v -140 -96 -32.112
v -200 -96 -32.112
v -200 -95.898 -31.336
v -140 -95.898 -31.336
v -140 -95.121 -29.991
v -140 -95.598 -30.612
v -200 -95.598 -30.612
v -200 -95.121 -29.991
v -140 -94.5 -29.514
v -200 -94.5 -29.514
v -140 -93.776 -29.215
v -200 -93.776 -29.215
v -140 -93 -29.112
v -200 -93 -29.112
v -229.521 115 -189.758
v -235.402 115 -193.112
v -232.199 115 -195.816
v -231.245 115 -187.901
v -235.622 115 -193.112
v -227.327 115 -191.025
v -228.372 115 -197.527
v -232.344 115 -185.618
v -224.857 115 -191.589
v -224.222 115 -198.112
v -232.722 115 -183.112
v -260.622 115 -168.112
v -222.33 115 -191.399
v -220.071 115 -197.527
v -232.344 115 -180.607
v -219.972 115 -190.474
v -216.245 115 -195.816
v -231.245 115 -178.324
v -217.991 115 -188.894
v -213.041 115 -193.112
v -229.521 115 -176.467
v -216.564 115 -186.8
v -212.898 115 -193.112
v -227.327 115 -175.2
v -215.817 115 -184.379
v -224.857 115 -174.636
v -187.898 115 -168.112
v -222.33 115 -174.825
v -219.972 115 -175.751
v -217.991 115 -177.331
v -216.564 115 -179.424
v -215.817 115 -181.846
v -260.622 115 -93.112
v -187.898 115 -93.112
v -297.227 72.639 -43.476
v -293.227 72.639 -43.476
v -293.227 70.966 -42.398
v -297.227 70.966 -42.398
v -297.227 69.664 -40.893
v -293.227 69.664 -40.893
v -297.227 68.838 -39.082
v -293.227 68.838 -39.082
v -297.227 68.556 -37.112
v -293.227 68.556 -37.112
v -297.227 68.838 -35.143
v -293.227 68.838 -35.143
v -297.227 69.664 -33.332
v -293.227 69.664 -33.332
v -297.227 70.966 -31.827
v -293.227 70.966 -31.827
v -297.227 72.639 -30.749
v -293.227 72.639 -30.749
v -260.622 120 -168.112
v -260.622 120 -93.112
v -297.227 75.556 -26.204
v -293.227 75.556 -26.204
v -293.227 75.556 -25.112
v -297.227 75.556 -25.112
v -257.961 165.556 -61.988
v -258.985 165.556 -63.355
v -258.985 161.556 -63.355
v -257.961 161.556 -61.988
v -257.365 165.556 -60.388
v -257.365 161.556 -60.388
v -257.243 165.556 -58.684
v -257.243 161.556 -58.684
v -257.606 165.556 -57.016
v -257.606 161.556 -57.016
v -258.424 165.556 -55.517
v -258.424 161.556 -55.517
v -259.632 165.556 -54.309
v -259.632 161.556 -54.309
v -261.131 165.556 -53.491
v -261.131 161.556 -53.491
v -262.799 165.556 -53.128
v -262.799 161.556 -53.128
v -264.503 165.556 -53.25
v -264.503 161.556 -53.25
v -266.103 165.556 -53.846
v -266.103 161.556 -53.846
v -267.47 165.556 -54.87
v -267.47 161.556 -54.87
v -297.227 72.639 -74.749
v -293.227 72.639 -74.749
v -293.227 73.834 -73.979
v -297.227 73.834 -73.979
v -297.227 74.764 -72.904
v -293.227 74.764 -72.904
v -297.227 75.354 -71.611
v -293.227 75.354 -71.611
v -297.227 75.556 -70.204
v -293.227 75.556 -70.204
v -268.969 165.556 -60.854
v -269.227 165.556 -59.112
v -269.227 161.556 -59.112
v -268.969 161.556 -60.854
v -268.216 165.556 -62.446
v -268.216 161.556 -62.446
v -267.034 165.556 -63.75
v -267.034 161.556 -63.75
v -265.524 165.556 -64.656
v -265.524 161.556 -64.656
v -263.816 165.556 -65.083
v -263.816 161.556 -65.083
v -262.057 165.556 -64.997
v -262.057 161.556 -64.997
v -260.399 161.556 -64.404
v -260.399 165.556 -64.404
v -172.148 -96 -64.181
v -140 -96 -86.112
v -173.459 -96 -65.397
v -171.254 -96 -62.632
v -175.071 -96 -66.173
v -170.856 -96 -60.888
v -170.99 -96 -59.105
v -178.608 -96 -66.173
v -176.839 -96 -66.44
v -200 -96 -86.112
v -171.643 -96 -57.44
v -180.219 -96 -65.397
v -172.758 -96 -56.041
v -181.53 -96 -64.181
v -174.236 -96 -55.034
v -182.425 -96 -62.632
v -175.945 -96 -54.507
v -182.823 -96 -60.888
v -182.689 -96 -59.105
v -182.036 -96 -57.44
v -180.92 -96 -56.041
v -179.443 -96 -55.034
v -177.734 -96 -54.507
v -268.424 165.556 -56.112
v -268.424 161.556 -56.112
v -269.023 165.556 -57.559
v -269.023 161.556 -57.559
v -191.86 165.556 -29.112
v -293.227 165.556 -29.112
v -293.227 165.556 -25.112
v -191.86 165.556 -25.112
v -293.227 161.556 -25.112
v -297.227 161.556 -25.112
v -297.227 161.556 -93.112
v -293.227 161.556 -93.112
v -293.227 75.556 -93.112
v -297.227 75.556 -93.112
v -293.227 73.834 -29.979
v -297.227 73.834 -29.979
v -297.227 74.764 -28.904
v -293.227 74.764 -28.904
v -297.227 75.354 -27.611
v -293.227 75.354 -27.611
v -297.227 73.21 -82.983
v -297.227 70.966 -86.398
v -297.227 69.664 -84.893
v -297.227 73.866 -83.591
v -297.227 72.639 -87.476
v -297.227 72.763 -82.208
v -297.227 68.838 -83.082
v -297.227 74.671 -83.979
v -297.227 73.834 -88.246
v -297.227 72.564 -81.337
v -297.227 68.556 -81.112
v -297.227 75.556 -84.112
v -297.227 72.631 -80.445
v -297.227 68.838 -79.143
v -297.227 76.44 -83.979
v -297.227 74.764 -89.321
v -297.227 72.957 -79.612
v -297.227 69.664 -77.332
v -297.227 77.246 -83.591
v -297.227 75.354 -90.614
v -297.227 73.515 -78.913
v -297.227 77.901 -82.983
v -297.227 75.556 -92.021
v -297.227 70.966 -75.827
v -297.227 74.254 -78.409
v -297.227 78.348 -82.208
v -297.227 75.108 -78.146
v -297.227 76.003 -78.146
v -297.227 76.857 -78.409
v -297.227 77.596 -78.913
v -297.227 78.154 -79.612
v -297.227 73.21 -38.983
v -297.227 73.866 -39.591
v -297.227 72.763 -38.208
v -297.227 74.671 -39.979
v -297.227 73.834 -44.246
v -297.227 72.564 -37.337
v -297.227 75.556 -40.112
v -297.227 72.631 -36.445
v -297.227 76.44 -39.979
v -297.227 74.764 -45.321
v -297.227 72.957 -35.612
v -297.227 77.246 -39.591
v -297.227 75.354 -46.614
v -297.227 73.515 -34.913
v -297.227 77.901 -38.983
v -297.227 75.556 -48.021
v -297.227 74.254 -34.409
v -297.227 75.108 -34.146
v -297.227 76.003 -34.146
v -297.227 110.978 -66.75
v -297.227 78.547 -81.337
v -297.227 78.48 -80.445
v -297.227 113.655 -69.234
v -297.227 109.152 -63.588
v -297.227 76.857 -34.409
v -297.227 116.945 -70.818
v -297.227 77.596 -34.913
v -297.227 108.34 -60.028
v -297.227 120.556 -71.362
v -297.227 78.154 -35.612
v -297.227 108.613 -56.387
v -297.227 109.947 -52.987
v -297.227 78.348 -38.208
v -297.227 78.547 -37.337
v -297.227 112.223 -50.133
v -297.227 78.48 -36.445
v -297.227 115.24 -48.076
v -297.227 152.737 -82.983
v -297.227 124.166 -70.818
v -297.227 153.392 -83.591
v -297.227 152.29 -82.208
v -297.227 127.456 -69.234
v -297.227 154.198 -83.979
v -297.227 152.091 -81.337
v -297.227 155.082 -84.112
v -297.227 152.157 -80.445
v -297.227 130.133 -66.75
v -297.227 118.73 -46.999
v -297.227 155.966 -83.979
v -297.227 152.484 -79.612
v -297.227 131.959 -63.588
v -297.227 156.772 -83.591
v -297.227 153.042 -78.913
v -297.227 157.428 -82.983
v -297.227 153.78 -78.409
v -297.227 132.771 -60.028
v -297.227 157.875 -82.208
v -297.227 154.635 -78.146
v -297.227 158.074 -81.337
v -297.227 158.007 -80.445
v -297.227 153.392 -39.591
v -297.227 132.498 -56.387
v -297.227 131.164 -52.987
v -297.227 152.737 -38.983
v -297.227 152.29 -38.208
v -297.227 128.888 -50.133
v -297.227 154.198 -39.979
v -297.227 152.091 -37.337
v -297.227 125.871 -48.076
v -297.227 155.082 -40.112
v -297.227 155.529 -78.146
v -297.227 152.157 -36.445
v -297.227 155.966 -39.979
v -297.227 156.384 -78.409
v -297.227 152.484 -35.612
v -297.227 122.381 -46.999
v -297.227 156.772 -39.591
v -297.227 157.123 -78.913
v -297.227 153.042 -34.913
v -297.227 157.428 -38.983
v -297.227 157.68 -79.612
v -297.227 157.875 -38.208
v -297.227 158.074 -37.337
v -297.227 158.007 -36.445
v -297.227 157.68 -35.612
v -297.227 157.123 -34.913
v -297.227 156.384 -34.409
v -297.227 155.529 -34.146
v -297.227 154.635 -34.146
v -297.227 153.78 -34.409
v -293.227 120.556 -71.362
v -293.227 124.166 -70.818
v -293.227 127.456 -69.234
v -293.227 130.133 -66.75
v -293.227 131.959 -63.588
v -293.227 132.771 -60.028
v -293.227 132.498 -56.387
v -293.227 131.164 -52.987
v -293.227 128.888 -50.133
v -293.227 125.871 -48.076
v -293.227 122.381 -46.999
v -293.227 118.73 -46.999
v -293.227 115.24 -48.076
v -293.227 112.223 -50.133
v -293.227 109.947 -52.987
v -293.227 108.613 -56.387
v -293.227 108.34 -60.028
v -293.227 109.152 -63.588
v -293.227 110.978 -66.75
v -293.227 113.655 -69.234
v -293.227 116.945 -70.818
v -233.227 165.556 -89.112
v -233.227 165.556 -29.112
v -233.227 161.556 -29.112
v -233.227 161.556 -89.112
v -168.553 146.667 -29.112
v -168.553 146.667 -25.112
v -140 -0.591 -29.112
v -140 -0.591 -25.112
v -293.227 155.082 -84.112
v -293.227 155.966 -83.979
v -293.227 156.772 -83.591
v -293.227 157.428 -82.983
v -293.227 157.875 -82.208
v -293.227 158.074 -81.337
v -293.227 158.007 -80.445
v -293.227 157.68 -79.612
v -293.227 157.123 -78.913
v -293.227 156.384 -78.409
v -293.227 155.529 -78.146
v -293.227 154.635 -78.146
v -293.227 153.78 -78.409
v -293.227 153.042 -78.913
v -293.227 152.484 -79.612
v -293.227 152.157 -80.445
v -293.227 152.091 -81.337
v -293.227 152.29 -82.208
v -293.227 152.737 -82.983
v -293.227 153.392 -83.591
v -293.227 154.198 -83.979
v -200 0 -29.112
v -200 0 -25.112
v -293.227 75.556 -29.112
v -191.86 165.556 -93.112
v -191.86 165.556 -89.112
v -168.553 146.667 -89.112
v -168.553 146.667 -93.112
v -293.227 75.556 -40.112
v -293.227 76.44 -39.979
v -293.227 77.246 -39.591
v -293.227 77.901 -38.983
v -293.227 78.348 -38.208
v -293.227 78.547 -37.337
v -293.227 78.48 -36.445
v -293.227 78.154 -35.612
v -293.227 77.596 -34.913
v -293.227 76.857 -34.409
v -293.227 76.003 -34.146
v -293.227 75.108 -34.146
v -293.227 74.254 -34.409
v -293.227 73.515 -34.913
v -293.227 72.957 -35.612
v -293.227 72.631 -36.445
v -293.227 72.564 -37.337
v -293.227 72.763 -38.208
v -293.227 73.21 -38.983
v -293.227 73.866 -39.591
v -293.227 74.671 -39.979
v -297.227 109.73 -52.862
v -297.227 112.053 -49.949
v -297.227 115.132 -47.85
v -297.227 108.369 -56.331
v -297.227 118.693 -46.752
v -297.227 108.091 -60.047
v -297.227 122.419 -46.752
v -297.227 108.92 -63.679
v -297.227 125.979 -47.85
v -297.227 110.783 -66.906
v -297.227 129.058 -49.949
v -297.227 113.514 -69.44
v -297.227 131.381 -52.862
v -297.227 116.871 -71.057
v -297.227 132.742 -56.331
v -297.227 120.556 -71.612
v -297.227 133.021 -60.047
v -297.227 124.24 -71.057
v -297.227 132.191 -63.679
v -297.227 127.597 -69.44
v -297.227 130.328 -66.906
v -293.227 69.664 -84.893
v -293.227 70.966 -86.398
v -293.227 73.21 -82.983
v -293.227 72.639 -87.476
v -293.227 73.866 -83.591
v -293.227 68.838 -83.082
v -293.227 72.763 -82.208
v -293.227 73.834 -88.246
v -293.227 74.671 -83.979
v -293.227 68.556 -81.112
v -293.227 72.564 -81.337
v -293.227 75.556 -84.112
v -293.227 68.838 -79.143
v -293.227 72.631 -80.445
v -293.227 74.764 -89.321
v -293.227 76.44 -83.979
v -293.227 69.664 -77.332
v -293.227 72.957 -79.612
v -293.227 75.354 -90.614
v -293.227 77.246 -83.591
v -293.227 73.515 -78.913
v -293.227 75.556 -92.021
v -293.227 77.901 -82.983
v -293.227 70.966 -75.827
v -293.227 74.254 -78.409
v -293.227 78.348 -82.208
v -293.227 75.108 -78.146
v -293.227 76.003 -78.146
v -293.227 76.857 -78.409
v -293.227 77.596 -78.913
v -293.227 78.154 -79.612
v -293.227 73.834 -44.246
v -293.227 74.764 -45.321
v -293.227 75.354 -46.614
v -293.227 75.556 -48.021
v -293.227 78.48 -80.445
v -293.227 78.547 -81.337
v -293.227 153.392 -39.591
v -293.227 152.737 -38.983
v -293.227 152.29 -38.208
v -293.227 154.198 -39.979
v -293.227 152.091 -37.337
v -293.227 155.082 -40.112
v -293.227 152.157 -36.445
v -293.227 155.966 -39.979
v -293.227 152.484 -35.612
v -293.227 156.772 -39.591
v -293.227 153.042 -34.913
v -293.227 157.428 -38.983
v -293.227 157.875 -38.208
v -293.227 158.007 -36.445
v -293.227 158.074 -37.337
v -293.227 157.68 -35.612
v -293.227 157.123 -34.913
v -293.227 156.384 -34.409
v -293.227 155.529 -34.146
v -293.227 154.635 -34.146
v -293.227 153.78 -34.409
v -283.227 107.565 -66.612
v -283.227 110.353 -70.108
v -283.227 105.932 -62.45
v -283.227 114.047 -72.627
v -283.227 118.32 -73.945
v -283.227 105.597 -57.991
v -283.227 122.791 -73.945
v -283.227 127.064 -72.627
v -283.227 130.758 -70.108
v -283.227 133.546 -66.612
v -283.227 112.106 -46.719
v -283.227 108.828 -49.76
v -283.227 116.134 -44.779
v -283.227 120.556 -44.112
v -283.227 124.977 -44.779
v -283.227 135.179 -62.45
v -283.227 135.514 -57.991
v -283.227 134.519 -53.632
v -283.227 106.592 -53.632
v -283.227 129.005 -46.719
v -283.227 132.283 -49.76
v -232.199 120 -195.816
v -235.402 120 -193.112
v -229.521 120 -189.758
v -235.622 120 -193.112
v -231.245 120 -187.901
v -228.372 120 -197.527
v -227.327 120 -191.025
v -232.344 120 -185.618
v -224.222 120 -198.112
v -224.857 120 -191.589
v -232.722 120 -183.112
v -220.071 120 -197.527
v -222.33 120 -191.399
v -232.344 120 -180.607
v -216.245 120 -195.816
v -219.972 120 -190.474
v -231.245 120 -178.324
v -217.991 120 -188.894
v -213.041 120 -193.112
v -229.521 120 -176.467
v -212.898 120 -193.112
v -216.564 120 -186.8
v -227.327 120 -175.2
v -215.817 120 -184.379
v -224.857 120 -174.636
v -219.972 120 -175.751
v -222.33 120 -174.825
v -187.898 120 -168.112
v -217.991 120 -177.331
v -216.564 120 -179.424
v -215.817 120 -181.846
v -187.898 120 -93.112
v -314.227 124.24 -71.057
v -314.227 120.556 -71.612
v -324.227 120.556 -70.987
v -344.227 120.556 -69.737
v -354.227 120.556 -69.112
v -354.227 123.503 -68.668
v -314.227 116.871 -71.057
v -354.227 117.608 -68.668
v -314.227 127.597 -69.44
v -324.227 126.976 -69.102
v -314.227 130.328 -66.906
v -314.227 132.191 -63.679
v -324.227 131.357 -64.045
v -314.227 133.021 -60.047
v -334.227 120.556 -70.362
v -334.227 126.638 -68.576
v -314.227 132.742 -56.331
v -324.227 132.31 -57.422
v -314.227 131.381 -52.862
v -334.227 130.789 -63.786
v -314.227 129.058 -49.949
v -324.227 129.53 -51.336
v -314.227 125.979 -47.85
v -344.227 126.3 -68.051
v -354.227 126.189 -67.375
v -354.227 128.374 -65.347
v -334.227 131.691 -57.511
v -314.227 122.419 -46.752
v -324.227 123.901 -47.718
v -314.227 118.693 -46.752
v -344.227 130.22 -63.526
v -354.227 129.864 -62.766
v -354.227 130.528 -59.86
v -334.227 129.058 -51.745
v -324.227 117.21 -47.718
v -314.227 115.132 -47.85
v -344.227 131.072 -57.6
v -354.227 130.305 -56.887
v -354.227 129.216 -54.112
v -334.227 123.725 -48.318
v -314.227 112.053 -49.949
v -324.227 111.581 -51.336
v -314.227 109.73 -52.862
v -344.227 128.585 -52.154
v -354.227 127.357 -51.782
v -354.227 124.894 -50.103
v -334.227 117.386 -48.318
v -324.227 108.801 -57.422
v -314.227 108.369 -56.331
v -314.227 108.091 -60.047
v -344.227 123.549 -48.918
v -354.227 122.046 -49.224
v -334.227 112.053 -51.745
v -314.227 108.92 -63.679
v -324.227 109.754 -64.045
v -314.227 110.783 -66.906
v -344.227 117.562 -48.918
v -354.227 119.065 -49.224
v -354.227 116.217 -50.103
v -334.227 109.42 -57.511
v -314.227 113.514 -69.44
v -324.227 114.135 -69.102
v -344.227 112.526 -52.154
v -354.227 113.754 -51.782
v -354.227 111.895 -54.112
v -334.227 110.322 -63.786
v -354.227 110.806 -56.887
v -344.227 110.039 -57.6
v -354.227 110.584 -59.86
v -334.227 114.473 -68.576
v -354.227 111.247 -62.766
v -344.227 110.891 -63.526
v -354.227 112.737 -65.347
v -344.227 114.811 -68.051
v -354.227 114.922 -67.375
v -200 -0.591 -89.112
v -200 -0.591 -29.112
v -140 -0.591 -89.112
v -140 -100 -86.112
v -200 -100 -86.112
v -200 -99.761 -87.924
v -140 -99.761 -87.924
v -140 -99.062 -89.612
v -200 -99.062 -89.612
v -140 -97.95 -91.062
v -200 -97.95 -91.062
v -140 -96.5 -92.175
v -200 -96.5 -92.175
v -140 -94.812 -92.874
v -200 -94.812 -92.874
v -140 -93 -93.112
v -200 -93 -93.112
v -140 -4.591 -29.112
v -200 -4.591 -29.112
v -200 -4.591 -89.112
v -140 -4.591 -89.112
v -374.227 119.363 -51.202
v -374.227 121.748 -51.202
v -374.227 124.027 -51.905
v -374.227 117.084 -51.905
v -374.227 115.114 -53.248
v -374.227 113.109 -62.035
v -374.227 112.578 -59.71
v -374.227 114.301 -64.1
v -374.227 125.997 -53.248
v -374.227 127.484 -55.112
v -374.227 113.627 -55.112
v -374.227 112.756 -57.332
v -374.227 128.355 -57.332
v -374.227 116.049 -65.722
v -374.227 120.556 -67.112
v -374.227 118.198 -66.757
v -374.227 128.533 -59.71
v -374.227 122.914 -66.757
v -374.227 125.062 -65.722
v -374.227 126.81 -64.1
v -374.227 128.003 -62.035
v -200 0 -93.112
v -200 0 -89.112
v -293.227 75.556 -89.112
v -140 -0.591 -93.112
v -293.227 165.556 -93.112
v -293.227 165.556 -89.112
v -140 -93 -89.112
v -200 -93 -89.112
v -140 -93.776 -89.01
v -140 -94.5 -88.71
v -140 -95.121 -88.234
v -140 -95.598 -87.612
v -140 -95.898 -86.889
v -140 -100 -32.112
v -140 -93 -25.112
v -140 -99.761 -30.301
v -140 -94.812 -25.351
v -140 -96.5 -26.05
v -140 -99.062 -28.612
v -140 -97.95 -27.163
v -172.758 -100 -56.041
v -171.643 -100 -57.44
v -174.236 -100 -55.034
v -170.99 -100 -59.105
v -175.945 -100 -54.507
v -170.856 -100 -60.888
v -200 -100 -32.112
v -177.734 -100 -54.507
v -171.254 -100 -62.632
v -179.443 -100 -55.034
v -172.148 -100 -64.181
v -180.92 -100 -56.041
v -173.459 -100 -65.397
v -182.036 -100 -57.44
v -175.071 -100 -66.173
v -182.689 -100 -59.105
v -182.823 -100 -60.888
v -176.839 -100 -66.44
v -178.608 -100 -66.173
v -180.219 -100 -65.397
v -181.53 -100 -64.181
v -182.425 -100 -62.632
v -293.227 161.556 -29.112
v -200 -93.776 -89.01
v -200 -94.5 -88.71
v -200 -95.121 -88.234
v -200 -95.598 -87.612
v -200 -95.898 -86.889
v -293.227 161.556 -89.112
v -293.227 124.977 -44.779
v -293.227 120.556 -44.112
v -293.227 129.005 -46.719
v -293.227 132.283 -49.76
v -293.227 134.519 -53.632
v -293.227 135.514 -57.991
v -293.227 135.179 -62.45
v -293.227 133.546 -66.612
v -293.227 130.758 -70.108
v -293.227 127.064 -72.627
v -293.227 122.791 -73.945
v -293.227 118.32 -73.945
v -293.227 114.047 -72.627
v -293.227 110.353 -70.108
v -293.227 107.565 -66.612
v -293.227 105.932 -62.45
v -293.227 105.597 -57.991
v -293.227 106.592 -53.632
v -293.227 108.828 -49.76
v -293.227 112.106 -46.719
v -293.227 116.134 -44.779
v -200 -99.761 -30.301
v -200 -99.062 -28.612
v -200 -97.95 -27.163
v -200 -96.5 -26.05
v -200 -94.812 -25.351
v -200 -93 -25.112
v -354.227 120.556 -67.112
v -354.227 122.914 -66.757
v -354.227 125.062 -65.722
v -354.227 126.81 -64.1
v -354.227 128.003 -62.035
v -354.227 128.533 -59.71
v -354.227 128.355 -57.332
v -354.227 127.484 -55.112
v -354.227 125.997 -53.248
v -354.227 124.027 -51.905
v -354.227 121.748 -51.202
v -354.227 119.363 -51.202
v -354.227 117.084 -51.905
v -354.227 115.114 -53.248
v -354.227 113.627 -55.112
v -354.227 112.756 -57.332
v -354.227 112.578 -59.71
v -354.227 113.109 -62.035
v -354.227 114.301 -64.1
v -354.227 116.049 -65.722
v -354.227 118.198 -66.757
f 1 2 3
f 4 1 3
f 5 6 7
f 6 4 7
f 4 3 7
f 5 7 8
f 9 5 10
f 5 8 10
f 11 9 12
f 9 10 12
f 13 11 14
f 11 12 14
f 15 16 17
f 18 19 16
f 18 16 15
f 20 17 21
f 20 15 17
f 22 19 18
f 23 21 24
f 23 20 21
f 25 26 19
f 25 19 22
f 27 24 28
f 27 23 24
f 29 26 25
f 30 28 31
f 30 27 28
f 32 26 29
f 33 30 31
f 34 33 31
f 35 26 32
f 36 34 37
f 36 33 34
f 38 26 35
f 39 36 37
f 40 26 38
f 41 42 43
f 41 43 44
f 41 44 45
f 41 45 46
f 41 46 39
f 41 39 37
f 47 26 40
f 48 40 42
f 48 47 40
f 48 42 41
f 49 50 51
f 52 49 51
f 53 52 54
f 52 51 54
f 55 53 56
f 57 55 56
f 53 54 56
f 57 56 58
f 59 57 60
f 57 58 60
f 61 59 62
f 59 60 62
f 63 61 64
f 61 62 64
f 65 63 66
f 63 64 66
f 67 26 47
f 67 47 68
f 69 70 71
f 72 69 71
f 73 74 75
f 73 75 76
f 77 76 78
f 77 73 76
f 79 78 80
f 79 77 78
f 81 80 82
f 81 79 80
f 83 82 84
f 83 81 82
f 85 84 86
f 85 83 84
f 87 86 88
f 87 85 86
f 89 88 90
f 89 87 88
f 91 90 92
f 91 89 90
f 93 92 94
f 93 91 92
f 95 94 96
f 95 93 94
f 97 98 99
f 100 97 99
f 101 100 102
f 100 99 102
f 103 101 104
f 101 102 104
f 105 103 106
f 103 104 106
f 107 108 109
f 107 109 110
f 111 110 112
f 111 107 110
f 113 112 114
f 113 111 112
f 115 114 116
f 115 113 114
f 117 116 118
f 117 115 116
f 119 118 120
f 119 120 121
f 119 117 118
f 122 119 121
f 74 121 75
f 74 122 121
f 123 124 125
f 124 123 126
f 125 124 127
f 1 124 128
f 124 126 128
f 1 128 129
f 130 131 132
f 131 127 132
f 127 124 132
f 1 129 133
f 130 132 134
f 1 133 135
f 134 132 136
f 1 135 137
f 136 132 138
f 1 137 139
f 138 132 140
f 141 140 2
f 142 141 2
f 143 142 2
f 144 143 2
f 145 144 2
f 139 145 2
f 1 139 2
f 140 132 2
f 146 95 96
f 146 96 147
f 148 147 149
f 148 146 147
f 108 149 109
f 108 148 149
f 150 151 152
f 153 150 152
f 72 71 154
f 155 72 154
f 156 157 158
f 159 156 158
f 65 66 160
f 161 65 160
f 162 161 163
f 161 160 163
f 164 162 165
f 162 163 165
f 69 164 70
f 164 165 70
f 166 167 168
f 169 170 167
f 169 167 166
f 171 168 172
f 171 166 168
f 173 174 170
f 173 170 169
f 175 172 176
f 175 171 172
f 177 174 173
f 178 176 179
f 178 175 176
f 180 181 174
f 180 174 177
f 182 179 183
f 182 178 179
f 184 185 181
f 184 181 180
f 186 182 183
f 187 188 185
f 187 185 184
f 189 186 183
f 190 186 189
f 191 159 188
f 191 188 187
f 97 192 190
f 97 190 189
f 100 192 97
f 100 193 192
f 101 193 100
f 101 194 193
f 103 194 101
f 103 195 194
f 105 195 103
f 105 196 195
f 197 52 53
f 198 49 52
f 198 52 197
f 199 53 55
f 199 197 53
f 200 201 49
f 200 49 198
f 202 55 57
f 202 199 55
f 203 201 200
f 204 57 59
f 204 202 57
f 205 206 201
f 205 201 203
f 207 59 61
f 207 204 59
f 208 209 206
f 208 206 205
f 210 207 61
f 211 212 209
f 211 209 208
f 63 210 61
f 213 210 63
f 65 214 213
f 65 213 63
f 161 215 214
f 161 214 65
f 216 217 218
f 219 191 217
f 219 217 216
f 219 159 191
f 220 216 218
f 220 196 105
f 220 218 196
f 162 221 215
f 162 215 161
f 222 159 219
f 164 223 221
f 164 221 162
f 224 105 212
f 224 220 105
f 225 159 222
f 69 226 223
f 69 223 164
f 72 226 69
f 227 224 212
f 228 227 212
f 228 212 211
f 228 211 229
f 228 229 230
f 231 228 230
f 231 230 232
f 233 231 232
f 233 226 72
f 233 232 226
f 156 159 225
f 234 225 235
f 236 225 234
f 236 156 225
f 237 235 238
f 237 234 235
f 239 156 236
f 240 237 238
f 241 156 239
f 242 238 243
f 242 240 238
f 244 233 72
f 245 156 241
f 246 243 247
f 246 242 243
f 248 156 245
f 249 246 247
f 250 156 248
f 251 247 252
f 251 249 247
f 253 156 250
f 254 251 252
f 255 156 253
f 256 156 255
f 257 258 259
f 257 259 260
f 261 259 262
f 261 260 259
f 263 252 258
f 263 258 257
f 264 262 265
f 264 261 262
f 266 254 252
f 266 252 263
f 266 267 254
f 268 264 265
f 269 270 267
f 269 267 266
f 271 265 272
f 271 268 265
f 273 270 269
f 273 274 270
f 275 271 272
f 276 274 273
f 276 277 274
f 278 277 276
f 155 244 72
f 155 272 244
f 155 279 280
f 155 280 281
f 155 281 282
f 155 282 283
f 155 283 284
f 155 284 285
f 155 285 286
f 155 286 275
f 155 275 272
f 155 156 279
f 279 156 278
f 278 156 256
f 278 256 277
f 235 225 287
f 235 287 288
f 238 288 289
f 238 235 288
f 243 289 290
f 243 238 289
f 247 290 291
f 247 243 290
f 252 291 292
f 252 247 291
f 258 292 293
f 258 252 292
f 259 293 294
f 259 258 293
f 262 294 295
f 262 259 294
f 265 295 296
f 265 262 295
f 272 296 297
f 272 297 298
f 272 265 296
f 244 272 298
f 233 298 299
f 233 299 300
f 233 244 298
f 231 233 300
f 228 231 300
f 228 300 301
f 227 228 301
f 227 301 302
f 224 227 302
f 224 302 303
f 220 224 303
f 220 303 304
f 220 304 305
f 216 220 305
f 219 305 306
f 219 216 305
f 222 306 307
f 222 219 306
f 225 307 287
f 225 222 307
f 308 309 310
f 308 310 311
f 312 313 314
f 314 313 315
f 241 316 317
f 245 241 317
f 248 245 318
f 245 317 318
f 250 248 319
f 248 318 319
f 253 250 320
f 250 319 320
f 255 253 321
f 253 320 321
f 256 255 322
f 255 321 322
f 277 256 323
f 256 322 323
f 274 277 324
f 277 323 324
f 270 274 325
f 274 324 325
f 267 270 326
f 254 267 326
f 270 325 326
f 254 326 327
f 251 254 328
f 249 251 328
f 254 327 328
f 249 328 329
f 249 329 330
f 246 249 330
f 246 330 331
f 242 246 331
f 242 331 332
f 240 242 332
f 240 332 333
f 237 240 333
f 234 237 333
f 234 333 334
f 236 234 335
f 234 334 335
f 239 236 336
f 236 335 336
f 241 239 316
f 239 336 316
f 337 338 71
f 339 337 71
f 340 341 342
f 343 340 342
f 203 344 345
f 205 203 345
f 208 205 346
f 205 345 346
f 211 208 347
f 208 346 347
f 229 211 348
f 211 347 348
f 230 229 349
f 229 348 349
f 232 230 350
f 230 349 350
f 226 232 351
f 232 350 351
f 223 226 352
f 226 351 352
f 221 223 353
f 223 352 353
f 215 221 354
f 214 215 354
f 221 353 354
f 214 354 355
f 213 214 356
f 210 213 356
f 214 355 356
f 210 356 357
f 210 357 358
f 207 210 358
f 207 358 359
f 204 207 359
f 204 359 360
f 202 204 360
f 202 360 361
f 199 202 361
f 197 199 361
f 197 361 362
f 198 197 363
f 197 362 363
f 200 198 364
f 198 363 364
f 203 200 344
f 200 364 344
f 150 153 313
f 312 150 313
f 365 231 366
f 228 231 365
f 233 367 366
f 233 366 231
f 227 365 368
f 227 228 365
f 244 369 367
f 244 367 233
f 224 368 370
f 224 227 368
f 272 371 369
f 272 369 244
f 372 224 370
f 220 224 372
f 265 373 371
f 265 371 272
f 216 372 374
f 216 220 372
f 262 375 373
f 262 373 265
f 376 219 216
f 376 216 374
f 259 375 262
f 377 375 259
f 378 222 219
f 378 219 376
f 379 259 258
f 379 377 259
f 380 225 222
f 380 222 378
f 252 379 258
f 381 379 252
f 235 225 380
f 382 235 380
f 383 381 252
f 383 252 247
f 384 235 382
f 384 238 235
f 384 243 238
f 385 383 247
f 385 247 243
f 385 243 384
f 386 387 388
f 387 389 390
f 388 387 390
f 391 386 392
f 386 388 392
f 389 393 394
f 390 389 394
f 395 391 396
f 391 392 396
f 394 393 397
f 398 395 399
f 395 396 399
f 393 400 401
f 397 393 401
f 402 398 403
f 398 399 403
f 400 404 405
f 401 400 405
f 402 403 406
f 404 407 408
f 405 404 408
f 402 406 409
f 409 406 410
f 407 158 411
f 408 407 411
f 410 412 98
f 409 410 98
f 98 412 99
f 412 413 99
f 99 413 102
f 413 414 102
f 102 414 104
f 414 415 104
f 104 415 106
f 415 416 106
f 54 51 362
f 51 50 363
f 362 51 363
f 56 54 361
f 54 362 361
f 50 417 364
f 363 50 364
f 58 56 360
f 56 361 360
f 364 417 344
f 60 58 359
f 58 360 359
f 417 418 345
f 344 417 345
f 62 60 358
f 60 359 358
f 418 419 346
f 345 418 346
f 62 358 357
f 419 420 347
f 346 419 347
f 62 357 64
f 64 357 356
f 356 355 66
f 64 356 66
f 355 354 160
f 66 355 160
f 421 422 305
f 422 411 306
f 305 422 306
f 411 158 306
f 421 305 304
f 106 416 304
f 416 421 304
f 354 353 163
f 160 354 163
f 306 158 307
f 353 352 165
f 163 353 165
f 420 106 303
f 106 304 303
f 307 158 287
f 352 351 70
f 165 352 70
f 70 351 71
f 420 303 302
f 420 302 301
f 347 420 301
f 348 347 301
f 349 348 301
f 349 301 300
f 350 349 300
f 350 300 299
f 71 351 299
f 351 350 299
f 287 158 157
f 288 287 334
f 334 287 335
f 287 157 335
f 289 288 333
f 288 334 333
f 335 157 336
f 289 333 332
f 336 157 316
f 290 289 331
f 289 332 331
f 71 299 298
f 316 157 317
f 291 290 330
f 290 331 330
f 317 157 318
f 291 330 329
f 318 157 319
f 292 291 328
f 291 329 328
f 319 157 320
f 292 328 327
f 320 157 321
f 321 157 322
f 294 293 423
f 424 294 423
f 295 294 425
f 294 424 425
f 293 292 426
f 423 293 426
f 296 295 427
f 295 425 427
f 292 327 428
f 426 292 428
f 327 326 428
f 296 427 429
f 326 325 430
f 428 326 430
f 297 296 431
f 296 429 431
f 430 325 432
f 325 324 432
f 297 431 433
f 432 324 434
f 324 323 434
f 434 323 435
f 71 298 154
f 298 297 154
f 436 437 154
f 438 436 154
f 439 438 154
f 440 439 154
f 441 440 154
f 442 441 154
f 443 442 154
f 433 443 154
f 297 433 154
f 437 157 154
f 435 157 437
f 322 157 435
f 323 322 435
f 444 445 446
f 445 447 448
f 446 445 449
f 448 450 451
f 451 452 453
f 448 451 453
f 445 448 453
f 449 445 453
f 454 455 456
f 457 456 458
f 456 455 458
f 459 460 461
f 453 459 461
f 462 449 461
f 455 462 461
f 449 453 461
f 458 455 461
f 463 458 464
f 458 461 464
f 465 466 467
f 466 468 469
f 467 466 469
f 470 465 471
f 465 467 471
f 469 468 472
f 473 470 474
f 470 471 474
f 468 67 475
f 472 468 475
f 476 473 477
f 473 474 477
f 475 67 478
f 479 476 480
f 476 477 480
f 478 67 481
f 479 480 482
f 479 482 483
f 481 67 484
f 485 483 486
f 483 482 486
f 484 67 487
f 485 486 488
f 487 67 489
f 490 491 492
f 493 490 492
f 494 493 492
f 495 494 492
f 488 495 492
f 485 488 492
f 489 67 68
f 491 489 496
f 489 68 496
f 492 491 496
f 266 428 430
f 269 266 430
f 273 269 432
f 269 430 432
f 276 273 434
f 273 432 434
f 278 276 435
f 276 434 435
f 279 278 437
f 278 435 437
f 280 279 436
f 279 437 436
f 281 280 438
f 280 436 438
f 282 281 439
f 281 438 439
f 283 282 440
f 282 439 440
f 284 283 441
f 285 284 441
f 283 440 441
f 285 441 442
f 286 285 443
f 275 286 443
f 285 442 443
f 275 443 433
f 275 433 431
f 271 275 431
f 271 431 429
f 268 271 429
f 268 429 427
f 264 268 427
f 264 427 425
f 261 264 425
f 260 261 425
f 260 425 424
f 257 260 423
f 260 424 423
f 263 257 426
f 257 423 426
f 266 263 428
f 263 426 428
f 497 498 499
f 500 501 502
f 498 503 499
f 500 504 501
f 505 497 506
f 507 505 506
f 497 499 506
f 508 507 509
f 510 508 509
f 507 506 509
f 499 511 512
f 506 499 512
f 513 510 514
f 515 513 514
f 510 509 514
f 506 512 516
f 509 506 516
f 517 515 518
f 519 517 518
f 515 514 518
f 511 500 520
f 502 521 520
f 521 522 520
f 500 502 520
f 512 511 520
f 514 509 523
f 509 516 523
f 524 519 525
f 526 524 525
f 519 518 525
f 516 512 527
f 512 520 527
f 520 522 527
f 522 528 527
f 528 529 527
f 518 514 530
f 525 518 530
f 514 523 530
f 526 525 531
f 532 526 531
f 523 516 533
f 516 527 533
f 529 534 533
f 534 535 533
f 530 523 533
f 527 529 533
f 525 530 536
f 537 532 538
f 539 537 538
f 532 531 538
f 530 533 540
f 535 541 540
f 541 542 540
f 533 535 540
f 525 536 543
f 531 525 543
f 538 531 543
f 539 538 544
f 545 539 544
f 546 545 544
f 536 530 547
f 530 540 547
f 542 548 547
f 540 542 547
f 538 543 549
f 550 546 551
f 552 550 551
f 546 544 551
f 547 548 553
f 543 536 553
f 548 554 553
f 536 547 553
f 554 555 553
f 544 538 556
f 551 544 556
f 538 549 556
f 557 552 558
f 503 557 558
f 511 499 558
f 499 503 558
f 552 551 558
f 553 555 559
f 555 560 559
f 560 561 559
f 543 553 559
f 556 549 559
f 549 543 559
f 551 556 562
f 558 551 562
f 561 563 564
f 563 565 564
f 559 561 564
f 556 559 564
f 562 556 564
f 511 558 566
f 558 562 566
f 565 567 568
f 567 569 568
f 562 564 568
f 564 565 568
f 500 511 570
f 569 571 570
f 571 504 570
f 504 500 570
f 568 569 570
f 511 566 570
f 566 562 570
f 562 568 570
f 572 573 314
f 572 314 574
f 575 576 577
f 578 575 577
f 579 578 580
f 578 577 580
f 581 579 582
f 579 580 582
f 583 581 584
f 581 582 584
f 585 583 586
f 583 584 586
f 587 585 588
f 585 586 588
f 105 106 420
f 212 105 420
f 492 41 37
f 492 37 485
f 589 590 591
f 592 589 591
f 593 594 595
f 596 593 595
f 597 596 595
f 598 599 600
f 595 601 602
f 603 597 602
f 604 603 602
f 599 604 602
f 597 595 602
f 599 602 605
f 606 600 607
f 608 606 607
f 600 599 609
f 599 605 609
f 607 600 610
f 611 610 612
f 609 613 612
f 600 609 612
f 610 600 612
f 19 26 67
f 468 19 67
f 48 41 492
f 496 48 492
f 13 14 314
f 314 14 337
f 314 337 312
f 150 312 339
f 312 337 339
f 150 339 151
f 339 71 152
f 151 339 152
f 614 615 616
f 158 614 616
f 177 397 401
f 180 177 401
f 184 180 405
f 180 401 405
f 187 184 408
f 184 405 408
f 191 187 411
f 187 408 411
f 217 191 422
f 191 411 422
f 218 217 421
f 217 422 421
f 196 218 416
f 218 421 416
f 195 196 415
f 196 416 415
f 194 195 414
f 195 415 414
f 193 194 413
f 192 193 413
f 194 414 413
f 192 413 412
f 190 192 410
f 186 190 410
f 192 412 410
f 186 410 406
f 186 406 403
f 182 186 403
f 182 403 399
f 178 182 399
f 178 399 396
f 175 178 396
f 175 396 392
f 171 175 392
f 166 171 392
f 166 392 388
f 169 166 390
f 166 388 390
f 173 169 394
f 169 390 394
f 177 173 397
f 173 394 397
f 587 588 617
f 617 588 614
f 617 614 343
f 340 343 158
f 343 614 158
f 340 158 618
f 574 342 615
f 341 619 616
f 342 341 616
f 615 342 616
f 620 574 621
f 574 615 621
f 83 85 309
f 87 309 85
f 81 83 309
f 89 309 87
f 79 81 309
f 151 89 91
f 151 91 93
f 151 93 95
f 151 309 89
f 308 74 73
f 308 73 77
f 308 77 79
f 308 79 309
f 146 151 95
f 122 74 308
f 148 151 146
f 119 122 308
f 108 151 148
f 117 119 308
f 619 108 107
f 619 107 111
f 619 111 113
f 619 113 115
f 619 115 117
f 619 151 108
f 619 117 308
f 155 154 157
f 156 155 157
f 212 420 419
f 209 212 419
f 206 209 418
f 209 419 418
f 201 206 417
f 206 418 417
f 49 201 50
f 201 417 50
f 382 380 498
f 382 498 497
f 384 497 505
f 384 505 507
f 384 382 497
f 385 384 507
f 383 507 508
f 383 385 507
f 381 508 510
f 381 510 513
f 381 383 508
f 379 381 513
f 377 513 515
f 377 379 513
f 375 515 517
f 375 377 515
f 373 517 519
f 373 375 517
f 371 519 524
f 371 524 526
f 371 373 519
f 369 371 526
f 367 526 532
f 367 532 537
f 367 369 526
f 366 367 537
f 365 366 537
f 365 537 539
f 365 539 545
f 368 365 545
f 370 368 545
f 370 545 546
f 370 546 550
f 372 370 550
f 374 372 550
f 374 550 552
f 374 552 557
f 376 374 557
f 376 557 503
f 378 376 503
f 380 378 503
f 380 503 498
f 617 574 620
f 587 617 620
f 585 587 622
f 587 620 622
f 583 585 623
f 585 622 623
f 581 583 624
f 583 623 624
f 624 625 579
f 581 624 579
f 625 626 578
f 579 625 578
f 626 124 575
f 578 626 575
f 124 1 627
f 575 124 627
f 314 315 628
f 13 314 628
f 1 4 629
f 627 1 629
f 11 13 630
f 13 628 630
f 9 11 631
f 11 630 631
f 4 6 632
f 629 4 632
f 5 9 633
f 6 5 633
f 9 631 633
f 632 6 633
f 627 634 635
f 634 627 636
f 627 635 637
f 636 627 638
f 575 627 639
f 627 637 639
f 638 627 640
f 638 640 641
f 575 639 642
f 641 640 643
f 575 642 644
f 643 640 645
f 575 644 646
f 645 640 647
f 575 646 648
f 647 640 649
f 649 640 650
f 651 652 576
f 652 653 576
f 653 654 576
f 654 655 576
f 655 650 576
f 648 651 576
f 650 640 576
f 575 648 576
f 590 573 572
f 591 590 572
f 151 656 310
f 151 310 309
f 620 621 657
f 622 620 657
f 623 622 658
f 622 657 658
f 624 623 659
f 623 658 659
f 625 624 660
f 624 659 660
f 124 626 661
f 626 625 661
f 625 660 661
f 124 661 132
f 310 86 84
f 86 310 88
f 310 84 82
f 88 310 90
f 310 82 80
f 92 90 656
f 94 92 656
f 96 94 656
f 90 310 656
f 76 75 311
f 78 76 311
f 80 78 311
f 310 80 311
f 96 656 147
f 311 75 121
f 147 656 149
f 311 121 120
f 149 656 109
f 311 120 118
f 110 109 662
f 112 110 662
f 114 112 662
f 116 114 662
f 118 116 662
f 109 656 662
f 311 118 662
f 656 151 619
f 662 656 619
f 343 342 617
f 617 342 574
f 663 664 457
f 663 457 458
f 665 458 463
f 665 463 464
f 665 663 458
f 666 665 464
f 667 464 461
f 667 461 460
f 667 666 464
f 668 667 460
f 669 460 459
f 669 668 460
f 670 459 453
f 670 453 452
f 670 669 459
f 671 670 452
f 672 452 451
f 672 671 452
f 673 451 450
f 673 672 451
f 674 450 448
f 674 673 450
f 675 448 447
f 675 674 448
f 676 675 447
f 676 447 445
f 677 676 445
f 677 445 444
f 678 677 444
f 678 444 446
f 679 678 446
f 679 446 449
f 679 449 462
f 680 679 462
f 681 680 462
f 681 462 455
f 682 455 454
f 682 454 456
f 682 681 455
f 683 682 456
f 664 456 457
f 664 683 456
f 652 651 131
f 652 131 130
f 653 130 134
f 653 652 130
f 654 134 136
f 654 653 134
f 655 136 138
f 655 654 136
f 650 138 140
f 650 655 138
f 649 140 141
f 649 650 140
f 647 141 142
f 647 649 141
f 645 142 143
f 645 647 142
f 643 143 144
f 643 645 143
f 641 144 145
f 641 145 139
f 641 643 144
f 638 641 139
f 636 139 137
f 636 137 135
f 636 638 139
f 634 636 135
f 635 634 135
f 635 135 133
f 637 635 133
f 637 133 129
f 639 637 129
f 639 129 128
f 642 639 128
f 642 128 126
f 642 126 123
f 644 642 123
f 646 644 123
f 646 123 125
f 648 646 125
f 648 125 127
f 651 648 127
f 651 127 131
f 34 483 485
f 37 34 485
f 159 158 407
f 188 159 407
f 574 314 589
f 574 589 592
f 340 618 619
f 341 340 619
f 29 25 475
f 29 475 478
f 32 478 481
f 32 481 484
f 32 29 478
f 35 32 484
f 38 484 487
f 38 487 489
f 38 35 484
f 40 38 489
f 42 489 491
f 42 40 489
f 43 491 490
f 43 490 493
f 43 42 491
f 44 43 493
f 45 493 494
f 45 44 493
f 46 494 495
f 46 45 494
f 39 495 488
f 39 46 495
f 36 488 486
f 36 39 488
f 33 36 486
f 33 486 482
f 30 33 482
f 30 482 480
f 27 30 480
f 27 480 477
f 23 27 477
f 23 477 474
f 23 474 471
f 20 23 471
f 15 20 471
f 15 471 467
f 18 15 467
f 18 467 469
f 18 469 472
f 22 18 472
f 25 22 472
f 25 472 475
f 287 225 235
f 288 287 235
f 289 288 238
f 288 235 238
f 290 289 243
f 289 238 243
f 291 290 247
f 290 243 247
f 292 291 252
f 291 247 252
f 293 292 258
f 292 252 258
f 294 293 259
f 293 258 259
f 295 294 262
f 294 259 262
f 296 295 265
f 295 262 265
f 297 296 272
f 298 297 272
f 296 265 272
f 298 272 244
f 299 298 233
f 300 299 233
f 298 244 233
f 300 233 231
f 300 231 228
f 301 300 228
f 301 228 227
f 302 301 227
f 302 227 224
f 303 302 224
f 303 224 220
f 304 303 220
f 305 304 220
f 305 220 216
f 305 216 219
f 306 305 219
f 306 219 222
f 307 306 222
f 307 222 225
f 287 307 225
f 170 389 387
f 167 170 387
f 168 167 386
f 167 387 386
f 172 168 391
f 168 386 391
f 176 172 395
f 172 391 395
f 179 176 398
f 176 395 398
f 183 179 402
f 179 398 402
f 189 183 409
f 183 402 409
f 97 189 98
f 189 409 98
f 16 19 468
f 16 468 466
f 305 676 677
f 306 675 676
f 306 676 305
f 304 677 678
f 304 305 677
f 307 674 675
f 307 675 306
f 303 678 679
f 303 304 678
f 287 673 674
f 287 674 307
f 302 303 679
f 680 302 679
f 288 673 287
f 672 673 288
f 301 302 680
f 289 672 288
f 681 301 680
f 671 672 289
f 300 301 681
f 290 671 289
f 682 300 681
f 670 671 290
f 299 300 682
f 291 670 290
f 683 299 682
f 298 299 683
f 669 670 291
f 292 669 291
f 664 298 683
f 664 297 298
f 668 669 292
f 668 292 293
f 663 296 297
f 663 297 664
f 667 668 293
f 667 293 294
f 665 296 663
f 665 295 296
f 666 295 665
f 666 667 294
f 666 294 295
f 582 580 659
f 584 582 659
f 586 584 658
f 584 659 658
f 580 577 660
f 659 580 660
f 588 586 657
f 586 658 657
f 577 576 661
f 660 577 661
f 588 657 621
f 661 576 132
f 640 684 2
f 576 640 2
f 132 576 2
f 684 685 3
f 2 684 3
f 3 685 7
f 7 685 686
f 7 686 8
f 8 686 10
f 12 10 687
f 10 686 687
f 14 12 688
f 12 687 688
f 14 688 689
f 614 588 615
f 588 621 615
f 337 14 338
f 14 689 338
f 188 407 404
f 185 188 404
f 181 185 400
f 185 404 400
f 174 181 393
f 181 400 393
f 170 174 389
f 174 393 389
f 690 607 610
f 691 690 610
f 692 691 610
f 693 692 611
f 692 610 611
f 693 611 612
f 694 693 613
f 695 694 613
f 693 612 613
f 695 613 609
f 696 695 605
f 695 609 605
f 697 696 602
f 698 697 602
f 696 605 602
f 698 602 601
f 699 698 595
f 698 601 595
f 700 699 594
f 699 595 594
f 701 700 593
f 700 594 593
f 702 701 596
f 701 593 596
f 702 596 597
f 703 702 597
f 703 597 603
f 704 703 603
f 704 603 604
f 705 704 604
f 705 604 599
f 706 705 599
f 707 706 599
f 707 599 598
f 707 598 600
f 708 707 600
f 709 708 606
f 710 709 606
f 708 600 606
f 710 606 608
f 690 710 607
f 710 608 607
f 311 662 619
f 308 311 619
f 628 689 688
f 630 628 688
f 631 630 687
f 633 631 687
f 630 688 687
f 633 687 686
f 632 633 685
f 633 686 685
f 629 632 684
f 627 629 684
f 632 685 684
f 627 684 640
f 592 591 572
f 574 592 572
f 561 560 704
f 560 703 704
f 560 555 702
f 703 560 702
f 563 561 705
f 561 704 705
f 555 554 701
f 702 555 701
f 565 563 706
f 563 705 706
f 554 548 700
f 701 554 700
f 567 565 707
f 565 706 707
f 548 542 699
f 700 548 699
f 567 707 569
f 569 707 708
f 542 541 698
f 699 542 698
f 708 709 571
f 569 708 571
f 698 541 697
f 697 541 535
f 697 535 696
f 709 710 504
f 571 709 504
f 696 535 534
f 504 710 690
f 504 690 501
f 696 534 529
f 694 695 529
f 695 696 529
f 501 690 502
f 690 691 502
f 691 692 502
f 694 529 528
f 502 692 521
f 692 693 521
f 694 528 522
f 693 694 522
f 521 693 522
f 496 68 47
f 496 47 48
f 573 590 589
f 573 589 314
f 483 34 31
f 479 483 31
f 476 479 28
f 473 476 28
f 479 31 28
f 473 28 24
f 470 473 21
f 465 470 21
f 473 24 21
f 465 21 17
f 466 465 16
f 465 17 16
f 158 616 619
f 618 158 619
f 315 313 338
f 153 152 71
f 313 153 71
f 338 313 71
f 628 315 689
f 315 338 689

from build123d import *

# Parameters (mm, degrees)
BOSS_EXTRUDE2_DEPTH  = 107
CUT_EXTRUDE1_DEPTH   = 214
SKETCH5_W            = 60
SKETCH5_H            = 4
BOSS_EXTRUDE3_DEPTH  = 60
SKETCH6_W            = 60
SKETCH6_H            = 4
BOSS_EXTRUDE4_DEPTH  = 60
SKETCH7_R            = 3
BOSS_EXTRUDE5_DEPTH  = 4
SKETCH8_W            = 72.723840611
SKETCH8_H            = 5
BOSS_EXTRUDE6_DEPTH  = 100
CHAMFER1_SIZE        = 25
CHAMFER2_SIZE        = 25
SKETCH9_R            = 15
BOSS_EXTRUDE7_DEPTH  = 5
SKETCH10_R           = 12.25
CUT_EXTRUDE2_DEPTH   = 4
CUT_EXTRUDE5_DEPTH   = 8
SKETCH13_R           = 6
CUT_EXTRUDE6_DEPTH   = 10
SKETCH15_R           = 15
BOSS_EXTRUDE8_DEPTH  = 10
SKETCH16_R           = 12.25
BOSS_EXTRUDE9_DEPTH  = 10
SKETCH17_R           = 12.5
BOSS_EXTRUDE10_DEPTH = 77
SKETCH18_R           = 12.5
SKETCH18_R_2         = 8
CUT_EXTRUDE7_DEPTH   = 20
CHAMFER3_SIZE        = 40
CHAMFER3_SIZE2       = 2.5
SKETCH19_R           = 8.5
CUT_EXTRUDE8_DEPTH   = 20


with BuildPart() as part:
    # Sketch3 → Boss-Extrude2 (new, symmetric)
    with BuildSketch(Plane(origin=(0, 0, 0), x_dir=(0, 0, -1), z_dir=(1, 0, 0))):
        with BuildLine():
            Line((93.112387021, -93), (93.112387021, 165.555555556))
            Line((93.112387021, 165.555555556), (89.112387021, 165.555555556))
            Line((89.112387021, 165.555555556), (89.112387021, -93))
            ThreePointArc((89.112387021, -93), (88.233707365, -95.121320344), (86.112387021, -96))
            Line((86.112387021, -96), (32.112387021, -96))
            ThreePointArc((32.112387021, -96), (29.991066678, -95.121320344), (29.112387021, -93))
            Line((29.112387021, -93), (29.112387021, 165.555555556))
            Line((29.112387021, 165.555555556), (25.112387021, 165.555555556))
            Line((25.112387021, 165.555555556), (25.112387021, -93))
            ThreePointArc((25.112387021, -93), (27.162639553, -97.949747468), (32.112387021, -100))
            Line((32.112387021, -100), (86.112387021, -100))
            ThreePointArc((86.112387021, -100), (91.06213449, -97.949747468), (93.112387021, -93))
        make_face()
    extrude(amount=BOSS_EXTRUDE2_DEPTH, both=True)

    # Sketch4 → Cut-Extrude1 (cut)
    with BuildSketch(Plane.XY):
        Polygon((-190, 11.896699378), (-190, -230), (130, -230), (130, -61.975068301), (223.227453171, 13.580487255), (223.227453171, 295.555555556), (-54.204269584, 295.555555556), (-150.061773181, 217.868493514), align=None)
        Polygon((-60, -0.59060332), (-60, -100), (0, -100), (0, 0), (93.227453171, 75.555555556), (93.227453171, 165.555555556), (-8.139740481, 165.555555556), (-31.446603774, 146.666666667), align=None, mode=Mode.SUBTRACT)
    extrude(amount=-CUT_EXTRUDE1_DEPTH, mode=Mode.SUBTRACT)

    # Sketch13 → Cut-Extrude6 (cut)
    with BuildSketch(Plane.XZ.offset(100)):
        with Locations(Location((-23.160596036, -60.439663785, 0), (0, 0, 270))):
            Circle(SKETCH13_R)
    extrude(amount=-CUT_EXTRUDE6_DEPTH, mode=Mode.SUBTRACT)


with BuildPart() as body_2:
    # Sketch5 → Boss-Extrude3 (new body)
    with BuildSketch(Plane(origin=(0, 0, 0), x_dir=(0, 0, -1), z_dir=(1, 0, 0))):
        with Locations((59.112387021, -2.59060332)):
            Rectangle(SKETCH5_W, SKETCH5_H)
    extrude(amount=-BOSS_EXTRUDE3_DEPTH)


with BuildPart() as body_3:
    # Sketch6 → Boss-Extrude4 (new body)
    with BuildSketch(Plane(origin=(93.227453171, 0, 0), x_dir=(0, 0, -1), z_dir=(1, 0, 0))):
        with Locations((59.112387021, 163.555555556)):
            Rectangle(SKETCH6_W, SKETCH6_H)
    extrude(amount=-BOSS_EXTRUDE4_DEPTH)

    # Sketch12 → Cut-Extrude5 (cut)
    with BuildSketch(Plane(origin=(0, 165.555555556, 0), x_dir=(1, 0, 0), z_dir=(0, 1, 0))):
        with BuildLine():
            ThreePointArc((69.227453171, 59.112387021), (65.523553765, 64.655664216), (58.984812484, 63.355027708))
            Line((58.984812484, 63.355027708), (67.470093858, 54.869746334))
            ThreePointArc((67.470093858, 54.869746334), (68.770730366, 56.816286427), (69.227453171, 59.112387021))
        make_face()
        with BuildLine():
            Line((67.470093858, 54.869746334), (58.984812484, 63.355027708))
            ThreePointArc((58.984812484, 63.355027708), (58.984812484, 54.869746334), (67.470093858, 54.869746334))
        make_face()
    extrude(amount=-CUT_EXTRUDE5_DEPTH, mode=Mode.SUBTRACT)


with BuildPart() as body_4:
    # Sketch7 → Boss-Extrude5 (new body)
    with BuildSketch(Plane(origin=(93.227453171, 0, 0), x_dir=(0, 0, -1), z_dir=(1, 0, 0))):
        with BuildLine():
            Line((25.112387021, 161.555555556), (93.112387021, 161.555555556))
            Line((93.112387021, 161.555555556), (93.112387021, 75.555555556))
            Line((93.112387021, 75.555555556), (92.021099136, 75.555555556))
            ThreePointArc((92.021099136, 75.555555556), (89.320790512, 74.763682613), (87.475802422, 72.638888889))
            ThreePointArc((87.475802422, 72.638888889), (81.112387021, 68.555555556), (74.748971621, 72.638888889))
            ThreePointArc((74.748971621, 72.638888889), (72.903983531, 74.763682613), (70.203674907, 75.555555556))
            Line((70.203674907, 75.555555556), (48.021099136, 75.555555556))
            ThreePointArc((48.021099136, 75.555555556), (45.320790512, 74.763682613), (43.475802422, 72.638888889))
            ThreePointArc((43.475802422, 72.638888889), (37.112387021, 68.555555556), (30.748971621, 72.638888889))
            ThreePointArc((30.748971621, 72.638888889), (28.903983531, 74.763682613), (26.203674907, 75.555555556))
            Line((26.203674907, 75.555555556), (25.112387021, 75.555555556))
            Line((25.112387021, 75.555555556), (25.112387021, 161.555555556))
        make_face()
        with Locations((37.112387021, 155.082134103)):
            Circle(SKETCH7_R, mode=Mode.SUBTRACT)
        with Locations((81.112387021, 155.082134103)):
            Circle(SKETCH7_R, mode=Mode.SUBTRACT)
        with Locations((37.112387021, 75.555555556)):
            Circle(SKETCH7_R, mode=Mode.SUBTRACT)
        with Locations((81.112387021, 75.555555556)):
            Circle(SKETCH7_R, mode=Mode.SUBTRACT)
    extrude(amount=BOSS_EXTRUDE5_DEPTH)

    # Sketch10 → Cut-Extrude2 (cut)
    with BuildSketch(Plane(origin=(97.227453171, 0, 0), x_dir=(0, 0, -1), z_dir=(1, 0, 0))):
        with Locations((59.112387021, 120.555555556)):
            Circle(SKETCH10_R)
    extrude(amount=-CUT_EXTRUDE2_DEPTH, mode=Mode.SUBTRACT)


with BuildPart() as body_5:
    # Sketch8 → Boss-Extrude6 (new body)
    with BuildSketch(Plane(origin=(0, 0, -93.112387021), x_dir=(-1, 0, 0), z_dir=(0, 0, -1))):
        with Locations((-24.25985796, 117.5)):
            Rectangle(SKETCH8_W, SKETCH8_H)
    extrude(amount=BOSS_EXTRUDE6_DEPTH)

    # Chamfer1
    chamfer1_edges = [body_5.edges().sort_by_distance(p)[0] for p in [
        (-12.102062346, 117.5, -193.112387021),
    ]]
    chamfer(chamfer1_edges, length=CHAMFER1_SIZE)

    # Chamfer2
    chamfer2_edges = [body_5.edges().sort_by_distance(p)[0] for p in [
        (60.621778265, 117.5, -193.112387021),
    ]]
    chamfer(chamfer2_edges, length=CHAMFER2_SIZE)

    # Sketch9 → Boss-Extrude7 (add)
    with BuildSketch(Plane.XZ.offset(-115)):
        with Locations((24.221778265, -183.112387021)):
            Circle(SKETCH9_R)
    extrude(amount=-BOSS_EXTRUDE7_DEPTH)

    # Sketch19 → Cut-Extrude8 (cut)
    with BuildSketch(Plane.XZ.offset(-115)):
        with Locations((24.221778265, -183.112387021)):
            Circle(SKETCH19_R)
    extrude(amount=-CUT_EXTRUDE8_DEPTH, mode=Mode.SUBTRACT)


with BuildPart() as body_6:
    # Sketch15 → Boss-Extrude8 (new body)
    with BuildSketch(Plane.ZY.offset(-93.227453171)):
        with Locations((-59.112387021, 120.555555556)):
            Circle(SKETCH15_R)
    extrude(amount=BOSS_EXTRUDE8_DEPTH)


with BuildPart() as body_7:
    # Sketch16 → Boss-Extrude9 (new body)
    with BuildSketch(Plane(origin=(97.227453171, 0, 0), x_dir=(0, 0, -1), z_dir=(1, 0, 0))):
        with Locations((59.112387021, 120.555555556)):
            Circle(SKETCH16_R)
    extrude(amount=-BOSS_EXTRUDE9_DEPTH)


with BuildPart() as body_8:
    # Sketch17 → Boss-Extrude10 (new body)
    with BuildSketch(Plane(origin=(97.227453171, 0, 0), x_dir=(0, 0, -1), z_dir=(1, 0, 0))):
        with Locations((59.112387021, 120.555555556)):
            Circle(SKETCH17_R)
    extrude(amount=BOSS_EXTRUDE10_DEPTH)

    # Sketch18 → Cut-Extrude7 (cut)
    with BuildSketch(Plane(origin=(174.227453171, 0, 0), x_dir=(0, 0, -1), z_dir=(1, 0, 0))):
        with Locations((59.112387021, 120.555555556)):
            Circle(SKETCH18_R)
        with Locations((59.112387021, 120.555555556)):
            Circle(SKETCH18_R_2, mode=Mode.SUBTRACT)
    extrude(amount=-CUT_EXTRUDE7_DEPTH, mode=Mode.SUBTRACT)

    # Chamfer3
    chamfer3_edges = [body_8.edges().sort_by_distance(p)[0] for p in [
        (154.227453171, 120.555555556, -46.612387021),
    ]]
    chamfer3_side = [body_8.faces().sort_by_distance(p)[0] for p in [
        (125.727453171, 120.555555556, -46.612387021),
    ]]
    chamfer(chamfer3_edges, length=CHAMFER3_SIZE, length2=CHAMFER3_SIZE2, reference=chamfer3_side[0])

    # Combine1: union body 7, body 6
    add(body_7.part)
    add(body_6.part)


with BuildPart() as body_7_2:
    # Mirror1: mirrored copy
    add(body_3.part.mirror(Plane(origin=(-100, 0, 0), x_dir=(0, 0, 1), z_dir=(1, 0, 0))))


with BuildPart() as body_8_2:
    # Mirror1 2: mirrored copy
    add(part.part.mirror(Plane(origin=(-100, 0, 0), x_dir=(0, 0, 1), z_dir=(1, 0, 0))))


with BuildPart() as body_9:
    # Mirror1 3: mirrored copy
    add(body_2.part.mirror(Plane(origin=(-100, 0, 0), x_dir=(0, 0, 1), z_dir=(1, 0, 0))))


with BuildPart() as body_10:
    # Mirror1 4: mirrored copy
    add(body_8.part.mirror(Plane(origin=(-100, 0, 0), x_dir=(0, 0, 1), z_dir=(1, 0, 0))))


with BuildPart() as body_11:
    # Mirror1 5: mirrored copy
    add(body_5.part.mirror(Plane(origin=(-100, 0, 0), x_dir=(0, 0, 1), z_dir=(1, 0, 0))))


with BuildPart() as body_12:
    # Mirror1 6: mirrored copy
    add(body_4.part.mirror(Plane(origin=(-100, 0, 0), x_dir=(0, 0, 1), z_dir=(1, 0, 0))))


solid = Compound([body_7_2.part, body_8_2.part, body_9.part, body_10.part, body_11.part, body_12.part])
